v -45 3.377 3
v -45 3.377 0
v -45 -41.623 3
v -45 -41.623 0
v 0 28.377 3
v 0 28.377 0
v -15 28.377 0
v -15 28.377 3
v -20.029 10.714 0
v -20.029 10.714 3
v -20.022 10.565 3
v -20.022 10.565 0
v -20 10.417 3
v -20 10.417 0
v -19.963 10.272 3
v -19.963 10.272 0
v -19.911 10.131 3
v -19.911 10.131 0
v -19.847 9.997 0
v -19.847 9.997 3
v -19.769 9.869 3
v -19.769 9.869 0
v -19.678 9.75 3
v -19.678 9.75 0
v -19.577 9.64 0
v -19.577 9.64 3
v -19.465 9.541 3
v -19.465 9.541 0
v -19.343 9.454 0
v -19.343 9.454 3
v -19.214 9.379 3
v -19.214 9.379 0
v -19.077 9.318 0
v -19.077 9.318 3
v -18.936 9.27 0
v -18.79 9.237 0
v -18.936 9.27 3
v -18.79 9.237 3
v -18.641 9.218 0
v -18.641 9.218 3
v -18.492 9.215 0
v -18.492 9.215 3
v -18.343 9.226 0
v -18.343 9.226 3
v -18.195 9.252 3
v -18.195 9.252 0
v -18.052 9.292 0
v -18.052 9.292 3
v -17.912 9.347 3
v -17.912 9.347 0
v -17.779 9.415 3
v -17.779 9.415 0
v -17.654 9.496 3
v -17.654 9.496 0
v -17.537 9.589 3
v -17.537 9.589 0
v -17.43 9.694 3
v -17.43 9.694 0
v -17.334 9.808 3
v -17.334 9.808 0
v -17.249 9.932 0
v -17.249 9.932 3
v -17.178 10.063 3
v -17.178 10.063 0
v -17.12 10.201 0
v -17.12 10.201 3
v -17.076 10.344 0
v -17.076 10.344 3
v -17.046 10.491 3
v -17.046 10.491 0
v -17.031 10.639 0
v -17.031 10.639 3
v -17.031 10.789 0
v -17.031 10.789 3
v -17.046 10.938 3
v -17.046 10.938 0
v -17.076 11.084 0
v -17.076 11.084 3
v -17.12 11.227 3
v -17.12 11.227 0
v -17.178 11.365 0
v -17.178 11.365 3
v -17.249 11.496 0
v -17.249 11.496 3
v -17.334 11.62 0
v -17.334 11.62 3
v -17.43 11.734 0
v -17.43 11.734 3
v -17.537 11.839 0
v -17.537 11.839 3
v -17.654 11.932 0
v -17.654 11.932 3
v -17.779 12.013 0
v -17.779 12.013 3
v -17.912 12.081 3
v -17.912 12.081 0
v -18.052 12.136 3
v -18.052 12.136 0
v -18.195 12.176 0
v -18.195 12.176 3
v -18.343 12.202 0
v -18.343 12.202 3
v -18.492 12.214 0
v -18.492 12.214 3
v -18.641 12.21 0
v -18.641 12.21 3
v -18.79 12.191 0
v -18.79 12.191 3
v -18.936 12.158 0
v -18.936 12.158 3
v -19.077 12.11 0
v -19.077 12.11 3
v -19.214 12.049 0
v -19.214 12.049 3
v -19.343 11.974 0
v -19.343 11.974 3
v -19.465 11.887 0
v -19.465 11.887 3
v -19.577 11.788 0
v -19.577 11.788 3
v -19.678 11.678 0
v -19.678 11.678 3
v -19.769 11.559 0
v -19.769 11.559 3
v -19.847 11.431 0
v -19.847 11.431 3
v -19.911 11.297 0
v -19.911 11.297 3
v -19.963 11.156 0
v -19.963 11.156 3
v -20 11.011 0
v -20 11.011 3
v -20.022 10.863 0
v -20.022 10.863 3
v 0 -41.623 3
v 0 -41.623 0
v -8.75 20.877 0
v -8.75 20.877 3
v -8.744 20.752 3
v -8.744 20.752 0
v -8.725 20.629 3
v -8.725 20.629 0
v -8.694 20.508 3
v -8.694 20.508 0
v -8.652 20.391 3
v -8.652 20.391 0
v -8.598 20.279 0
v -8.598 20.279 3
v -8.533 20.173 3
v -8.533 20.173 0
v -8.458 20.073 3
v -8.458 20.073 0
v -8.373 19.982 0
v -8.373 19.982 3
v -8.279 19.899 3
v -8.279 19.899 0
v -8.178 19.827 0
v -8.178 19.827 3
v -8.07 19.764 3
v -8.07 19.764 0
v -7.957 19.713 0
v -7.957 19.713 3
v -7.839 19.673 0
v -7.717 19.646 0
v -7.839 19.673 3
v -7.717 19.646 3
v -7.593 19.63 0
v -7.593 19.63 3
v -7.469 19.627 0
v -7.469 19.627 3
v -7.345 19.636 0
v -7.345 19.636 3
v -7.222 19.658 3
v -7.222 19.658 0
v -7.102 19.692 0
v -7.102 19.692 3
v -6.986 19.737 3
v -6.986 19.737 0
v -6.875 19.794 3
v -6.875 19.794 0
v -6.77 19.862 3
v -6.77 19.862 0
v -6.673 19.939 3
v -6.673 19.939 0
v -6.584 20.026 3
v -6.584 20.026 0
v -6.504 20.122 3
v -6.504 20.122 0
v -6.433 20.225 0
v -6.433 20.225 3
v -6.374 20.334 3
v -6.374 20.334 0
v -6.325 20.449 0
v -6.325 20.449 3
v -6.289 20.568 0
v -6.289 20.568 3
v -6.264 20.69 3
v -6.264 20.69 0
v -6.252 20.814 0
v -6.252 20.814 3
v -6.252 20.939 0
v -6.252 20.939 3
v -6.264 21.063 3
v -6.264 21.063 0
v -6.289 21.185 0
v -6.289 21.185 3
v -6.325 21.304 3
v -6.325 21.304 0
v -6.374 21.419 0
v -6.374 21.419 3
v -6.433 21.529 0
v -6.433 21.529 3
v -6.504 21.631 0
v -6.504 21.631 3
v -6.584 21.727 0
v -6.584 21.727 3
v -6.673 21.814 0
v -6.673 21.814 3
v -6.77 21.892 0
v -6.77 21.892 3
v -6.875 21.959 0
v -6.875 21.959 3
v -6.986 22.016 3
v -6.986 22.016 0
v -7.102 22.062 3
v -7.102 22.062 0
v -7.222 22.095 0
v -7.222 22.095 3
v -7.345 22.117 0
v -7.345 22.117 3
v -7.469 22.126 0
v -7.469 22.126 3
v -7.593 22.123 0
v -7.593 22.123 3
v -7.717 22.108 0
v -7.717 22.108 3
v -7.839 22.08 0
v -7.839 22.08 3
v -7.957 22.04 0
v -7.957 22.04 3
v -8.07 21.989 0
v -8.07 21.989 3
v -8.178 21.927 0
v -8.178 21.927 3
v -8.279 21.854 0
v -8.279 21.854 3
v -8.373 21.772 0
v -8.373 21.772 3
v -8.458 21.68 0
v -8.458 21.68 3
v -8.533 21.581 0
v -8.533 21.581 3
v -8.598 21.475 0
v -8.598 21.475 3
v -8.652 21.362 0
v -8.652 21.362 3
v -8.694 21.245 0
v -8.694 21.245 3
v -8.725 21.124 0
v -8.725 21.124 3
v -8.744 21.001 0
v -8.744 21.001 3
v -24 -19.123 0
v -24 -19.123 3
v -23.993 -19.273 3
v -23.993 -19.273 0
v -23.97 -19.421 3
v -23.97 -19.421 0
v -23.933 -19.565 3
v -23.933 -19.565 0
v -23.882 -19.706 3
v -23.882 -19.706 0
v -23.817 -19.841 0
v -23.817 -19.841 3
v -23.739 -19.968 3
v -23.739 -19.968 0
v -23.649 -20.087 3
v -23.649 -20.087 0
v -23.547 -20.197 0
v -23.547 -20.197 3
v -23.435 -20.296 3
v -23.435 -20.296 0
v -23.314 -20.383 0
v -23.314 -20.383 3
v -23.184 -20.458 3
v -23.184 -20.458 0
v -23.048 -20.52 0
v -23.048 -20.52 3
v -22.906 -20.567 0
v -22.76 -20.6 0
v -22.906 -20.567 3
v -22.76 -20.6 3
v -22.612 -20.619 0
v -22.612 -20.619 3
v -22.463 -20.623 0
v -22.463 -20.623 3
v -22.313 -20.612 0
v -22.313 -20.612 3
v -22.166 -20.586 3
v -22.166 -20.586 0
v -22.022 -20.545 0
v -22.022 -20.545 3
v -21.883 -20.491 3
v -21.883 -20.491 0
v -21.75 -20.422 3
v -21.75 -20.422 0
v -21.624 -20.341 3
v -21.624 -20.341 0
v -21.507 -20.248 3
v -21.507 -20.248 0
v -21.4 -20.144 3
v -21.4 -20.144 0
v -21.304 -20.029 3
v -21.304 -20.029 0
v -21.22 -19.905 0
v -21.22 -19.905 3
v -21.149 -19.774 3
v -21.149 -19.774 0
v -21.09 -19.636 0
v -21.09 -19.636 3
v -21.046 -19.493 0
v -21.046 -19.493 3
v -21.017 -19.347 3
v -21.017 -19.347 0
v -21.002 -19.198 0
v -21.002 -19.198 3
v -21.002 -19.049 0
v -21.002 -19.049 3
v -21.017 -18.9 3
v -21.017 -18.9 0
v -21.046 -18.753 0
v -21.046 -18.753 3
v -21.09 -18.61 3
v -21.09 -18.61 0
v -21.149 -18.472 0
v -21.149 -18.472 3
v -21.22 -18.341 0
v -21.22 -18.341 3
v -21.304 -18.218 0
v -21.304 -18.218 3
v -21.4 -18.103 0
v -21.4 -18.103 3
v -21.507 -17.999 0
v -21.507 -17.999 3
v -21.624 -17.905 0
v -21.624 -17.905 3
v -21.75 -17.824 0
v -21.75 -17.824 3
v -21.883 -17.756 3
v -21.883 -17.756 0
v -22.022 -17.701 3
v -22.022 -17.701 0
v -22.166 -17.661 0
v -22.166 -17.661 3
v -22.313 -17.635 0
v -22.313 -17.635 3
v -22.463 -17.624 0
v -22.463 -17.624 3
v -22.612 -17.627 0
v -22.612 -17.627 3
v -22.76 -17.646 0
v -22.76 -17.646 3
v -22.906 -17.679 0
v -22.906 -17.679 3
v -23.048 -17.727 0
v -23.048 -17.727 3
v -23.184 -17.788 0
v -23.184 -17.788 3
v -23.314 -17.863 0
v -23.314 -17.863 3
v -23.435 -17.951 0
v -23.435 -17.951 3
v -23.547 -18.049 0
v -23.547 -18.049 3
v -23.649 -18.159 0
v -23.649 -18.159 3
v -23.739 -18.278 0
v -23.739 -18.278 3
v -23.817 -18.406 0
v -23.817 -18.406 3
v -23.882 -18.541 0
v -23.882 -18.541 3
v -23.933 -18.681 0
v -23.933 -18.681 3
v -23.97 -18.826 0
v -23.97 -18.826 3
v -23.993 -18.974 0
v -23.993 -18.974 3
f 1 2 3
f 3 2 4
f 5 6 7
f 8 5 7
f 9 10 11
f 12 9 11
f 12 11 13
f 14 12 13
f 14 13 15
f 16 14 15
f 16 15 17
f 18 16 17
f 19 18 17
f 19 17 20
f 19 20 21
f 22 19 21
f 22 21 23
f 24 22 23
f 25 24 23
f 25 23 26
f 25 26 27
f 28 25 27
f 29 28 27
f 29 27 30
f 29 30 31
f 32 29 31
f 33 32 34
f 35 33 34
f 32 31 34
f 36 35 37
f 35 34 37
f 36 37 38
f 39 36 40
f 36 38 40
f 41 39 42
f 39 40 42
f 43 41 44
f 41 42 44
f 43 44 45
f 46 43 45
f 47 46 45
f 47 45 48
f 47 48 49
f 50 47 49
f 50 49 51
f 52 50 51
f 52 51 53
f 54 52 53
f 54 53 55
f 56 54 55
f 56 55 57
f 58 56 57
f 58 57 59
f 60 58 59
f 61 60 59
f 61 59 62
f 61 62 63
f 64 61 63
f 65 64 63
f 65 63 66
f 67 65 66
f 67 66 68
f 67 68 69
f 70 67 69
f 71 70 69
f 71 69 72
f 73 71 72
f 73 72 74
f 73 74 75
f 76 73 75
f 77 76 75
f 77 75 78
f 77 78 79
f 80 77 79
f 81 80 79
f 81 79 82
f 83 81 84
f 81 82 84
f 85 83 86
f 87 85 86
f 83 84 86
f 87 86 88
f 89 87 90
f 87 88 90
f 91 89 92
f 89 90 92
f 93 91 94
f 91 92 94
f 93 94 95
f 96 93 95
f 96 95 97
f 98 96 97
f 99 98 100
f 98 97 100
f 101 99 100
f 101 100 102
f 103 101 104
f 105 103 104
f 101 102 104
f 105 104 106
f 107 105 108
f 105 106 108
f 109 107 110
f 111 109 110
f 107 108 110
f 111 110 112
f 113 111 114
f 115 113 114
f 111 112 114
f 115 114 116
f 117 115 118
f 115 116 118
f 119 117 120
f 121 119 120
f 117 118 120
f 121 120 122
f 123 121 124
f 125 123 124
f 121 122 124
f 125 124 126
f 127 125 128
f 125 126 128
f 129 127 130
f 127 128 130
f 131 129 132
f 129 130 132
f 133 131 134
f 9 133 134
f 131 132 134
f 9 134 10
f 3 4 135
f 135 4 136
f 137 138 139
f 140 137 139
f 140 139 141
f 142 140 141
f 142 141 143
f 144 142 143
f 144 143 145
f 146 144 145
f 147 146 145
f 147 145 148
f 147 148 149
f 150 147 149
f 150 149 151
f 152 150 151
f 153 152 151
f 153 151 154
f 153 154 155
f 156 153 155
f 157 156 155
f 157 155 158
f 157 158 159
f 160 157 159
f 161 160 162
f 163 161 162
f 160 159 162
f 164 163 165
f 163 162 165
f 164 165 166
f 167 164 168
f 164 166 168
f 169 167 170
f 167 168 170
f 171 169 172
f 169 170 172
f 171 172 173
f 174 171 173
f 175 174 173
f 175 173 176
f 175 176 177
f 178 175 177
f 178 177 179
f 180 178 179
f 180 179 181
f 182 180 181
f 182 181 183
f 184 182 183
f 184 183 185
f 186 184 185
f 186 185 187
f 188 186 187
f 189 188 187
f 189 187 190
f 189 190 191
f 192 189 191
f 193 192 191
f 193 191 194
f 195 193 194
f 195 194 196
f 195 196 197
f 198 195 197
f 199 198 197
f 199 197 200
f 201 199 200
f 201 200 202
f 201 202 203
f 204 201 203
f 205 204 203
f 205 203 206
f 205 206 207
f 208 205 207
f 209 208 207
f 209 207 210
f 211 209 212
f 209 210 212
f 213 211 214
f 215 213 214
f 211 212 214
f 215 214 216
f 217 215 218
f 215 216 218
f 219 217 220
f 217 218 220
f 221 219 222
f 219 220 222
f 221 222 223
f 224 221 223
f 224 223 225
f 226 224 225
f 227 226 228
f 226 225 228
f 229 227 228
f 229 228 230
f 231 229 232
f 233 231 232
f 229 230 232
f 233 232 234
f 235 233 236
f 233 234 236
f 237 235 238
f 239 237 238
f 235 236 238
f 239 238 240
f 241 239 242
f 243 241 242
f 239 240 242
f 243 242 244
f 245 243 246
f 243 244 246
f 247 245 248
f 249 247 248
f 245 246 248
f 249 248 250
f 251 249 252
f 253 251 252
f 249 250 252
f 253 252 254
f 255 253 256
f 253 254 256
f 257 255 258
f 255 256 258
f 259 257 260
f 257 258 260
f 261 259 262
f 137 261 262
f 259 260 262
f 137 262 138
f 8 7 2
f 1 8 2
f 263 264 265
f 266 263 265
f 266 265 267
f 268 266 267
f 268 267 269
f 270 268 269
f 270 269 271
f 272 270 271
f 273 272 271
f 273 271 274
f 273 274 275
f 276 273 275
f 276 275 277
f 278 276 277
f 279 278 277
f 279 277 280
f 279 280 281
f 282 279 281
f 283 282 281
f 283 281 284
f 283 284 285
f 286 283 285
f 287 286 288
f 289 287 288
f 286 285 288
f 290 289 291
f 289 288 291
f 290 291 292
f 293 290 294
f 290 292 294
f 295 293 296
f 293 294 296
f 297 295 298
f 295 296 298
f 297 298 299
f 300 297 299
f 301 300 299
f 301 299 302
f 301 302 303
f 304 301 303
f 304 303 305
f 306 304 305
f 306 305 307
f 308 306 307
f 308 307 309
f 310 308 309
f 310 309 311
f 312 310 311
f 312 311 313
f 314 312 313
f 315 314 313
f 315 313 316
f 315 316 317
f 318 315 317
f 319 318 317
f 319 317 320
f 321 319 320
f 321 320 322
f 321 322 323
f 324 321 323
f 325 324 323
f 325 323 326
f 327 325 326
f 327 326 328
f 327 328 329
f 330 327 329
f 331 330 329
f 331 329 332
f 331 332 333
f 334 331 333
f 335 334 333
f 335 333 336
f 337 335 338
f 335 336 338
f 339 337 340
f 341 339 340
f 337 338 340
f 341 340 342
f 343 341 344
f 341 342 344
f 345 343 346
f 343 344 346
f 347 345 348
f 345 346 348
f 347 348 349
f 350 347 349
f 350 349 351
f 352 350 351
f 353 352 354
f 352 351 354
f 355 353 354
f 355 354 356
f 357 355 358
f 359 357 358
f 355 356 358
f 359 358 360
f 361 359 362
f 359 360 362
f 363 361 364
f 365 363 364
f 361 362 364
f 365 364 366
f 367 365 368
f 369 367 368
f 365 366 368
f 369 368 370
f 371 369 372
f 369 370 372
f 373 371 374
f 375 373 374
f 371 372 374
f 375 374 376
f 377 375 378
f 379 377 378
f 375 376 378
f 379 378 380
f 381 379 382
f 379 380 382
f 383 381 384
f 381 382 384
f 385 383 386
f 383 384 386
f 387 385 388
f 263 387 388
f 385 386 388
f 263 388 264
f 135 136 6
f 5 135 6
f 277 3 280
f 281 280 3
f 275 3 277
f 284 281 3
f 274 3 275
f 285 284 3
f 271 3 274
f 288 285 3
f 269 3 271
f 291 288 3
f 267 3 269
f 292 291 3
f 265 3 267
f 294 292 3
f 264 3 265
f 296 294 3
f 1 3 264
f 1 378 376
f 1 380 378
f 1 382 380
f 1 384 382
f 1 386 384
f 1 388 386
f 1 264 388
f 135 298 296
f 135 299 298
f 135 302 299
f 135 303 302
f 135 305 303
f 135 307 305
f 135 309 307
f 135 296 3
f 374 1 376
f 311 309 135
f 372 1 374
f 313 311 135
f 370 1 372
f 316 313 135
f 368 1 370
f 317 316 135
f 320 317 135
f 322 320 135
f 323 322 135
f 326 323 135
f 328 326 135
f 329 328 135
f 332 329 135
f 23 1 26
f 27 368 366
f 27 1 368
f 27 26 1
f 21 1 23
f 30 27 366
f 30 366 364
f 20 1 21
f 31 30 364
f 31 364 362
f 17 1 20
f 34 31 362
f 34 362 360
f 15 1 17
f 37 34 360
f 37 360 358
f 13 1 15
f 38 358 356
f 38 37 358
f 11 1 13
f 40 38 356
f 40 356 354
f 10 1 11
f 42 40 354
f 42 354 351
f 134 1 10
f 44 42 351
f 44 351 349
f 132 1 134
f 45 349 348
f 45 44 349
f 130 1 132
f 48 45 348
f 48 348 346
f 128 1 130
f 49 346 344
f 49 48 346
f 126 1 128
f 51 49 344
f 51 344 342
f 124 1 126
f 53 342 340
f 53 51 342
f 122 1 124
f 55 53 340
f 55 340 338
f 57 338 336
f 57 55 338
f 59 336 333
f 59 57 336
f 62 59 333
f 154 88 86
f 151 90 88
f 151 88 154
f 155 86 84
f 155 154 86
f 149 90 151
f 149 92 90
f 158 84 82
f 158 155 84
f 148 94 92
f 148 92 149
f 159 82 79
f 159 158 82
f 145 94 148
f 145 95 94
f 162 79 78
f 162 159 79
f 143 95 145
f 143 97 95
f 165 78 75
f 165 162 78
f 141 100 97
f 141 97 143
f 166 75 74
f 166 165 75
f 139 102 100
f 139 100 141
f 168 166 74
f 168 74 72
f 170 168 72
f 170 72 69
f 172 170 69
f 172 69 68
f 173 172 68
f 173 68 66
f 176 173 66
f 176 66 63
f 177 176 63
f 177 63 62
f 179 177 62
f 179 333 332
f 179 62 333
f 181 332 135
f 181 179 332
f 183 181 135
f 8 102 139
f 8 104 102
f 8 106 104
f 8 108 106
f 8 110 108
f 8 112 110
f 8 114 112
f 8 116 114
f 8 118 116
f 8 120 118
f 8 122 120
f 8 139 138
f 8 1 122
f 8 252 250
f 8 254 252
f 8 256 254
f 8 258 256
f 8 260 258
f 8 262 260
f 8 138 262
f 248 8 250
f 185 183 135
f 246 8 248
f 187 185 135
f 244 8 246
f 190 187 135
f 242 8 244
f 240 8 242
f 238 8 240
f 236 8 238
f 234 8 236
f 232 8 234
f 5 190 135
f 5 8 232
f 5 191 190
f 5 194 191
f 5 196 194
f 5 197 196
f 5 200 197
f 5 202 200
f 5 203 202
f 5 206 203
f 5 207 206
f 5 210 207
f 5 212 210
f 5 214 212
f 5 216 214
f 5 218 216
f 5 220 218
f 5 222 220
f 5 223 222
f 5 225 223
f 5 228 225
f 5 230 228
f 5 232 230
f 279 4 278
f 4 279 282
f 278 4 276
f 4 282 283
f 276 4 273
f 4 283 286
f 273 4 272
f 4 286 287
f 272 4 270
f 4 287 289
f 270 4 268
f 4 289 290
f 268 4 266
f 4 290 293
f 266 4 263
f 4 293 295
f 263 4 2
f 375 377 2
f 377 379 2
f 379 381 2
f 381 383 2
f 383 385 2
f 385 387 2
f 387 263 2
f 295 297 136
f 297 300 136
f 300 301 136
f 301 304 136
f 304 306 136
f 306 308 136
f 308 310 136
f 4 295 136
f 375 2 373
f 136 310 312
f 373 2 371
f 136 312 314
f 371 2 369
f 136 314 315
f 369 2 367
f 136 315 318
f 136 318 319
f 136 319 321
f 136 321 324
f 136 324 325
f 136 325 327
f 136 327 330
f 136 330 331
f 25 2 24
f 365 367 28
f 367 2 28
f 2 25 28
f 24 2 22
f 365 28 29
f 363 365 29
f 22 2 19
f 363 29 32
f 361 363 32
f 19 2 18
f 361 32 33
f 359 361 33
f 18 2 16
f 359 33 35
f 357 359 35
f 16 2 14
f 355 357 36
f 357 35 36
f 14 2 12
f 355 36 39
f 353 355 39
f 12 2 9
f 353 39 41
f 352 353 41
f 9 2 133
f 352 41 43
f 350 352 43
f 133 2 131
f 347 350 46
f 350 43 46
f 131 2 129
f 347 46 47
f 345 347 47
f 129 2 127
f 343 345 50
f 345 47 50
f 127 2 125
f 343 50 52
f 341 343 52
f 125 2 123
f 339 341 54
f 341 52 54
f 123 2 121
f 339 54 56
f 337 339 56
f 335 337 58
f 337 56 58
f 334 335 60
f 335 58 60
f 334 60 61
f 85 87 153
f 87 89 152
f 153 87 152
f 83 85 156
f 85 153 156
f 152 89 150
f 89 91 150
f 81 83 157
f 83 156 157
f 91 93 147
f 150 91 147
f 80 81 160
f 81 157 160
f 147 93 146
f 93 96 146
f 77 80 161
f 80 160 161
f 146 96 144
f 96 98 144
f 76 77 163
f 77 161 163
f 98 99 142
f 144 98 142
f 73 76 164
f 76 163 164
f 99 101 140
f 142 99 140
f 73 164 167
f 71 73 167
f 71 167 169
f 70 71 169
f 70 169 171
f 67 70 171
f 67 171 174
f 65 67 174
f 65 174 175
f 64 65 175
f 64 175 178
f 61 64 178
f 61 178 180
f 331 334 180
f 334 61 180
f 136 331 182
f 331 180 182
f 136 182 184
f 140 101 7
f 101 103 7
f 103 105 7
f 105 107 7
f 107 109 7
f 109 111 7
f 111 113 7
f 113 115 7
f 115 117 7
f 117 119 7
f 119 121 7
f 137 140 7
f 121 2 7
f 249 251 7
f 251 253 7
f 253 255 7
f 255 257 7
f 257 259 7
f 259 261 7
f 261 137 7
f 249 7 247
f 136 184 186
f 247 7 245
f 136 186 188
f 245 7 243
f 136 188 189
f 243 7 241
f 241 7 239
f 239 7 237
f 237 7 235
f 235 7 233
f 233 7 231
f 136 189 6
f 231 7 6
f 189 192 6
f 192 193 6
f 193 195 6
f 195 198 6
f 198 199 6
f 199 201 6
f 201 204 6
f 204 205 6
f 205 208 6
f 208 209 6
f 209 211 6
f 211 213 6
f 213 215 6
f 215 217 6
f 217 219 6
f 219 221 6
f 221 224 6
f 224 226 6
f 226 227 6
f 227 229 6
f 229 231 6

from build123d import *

# Parameters (mm, degrees)
F1_DEPTH = 3
F2_D     = 3
F3_D     = 3
F4_D     = 2.5


with BuildPart() as f1:
    # F0 (on Top) → F1 (new body)
    with BuildSketch(Plane.XY):
        Polygon((-45, -41.623287946), (0, -41.623287946), (0, 28.376712054), (-15, 28.376712054), (-45, 3.376712054), align=None)
    extrude(amount=F1_DEPTH)

    # F2 (through all)
    with Locations(Plane(origin=(0, 0, 0), x_dir=(1, 0, 0), z_dir=(0, 0, -1))):
        with Locations((-22.5, 19.123287946)):
            Hole(F2_D / 2)

    # F3 (through all)
    with Locations(Plane(origin=(0, 0, 0), x_dir=(1, 0, 0), z_dir=(0, 0, -1))):
        with Locations((-18.5292713703, -10.7140789706)):
            Hole(F3_D / 2)

    # F4 (through all)
    with Locations(Plane(origin=(0, 0, 0), x_dir=(1, 0, 0), z_dir=(0, 0, -1))):
        with Locations((-7.5, -20.876712054)):
            Hole(F4_D / 2)


solid = f1.part
